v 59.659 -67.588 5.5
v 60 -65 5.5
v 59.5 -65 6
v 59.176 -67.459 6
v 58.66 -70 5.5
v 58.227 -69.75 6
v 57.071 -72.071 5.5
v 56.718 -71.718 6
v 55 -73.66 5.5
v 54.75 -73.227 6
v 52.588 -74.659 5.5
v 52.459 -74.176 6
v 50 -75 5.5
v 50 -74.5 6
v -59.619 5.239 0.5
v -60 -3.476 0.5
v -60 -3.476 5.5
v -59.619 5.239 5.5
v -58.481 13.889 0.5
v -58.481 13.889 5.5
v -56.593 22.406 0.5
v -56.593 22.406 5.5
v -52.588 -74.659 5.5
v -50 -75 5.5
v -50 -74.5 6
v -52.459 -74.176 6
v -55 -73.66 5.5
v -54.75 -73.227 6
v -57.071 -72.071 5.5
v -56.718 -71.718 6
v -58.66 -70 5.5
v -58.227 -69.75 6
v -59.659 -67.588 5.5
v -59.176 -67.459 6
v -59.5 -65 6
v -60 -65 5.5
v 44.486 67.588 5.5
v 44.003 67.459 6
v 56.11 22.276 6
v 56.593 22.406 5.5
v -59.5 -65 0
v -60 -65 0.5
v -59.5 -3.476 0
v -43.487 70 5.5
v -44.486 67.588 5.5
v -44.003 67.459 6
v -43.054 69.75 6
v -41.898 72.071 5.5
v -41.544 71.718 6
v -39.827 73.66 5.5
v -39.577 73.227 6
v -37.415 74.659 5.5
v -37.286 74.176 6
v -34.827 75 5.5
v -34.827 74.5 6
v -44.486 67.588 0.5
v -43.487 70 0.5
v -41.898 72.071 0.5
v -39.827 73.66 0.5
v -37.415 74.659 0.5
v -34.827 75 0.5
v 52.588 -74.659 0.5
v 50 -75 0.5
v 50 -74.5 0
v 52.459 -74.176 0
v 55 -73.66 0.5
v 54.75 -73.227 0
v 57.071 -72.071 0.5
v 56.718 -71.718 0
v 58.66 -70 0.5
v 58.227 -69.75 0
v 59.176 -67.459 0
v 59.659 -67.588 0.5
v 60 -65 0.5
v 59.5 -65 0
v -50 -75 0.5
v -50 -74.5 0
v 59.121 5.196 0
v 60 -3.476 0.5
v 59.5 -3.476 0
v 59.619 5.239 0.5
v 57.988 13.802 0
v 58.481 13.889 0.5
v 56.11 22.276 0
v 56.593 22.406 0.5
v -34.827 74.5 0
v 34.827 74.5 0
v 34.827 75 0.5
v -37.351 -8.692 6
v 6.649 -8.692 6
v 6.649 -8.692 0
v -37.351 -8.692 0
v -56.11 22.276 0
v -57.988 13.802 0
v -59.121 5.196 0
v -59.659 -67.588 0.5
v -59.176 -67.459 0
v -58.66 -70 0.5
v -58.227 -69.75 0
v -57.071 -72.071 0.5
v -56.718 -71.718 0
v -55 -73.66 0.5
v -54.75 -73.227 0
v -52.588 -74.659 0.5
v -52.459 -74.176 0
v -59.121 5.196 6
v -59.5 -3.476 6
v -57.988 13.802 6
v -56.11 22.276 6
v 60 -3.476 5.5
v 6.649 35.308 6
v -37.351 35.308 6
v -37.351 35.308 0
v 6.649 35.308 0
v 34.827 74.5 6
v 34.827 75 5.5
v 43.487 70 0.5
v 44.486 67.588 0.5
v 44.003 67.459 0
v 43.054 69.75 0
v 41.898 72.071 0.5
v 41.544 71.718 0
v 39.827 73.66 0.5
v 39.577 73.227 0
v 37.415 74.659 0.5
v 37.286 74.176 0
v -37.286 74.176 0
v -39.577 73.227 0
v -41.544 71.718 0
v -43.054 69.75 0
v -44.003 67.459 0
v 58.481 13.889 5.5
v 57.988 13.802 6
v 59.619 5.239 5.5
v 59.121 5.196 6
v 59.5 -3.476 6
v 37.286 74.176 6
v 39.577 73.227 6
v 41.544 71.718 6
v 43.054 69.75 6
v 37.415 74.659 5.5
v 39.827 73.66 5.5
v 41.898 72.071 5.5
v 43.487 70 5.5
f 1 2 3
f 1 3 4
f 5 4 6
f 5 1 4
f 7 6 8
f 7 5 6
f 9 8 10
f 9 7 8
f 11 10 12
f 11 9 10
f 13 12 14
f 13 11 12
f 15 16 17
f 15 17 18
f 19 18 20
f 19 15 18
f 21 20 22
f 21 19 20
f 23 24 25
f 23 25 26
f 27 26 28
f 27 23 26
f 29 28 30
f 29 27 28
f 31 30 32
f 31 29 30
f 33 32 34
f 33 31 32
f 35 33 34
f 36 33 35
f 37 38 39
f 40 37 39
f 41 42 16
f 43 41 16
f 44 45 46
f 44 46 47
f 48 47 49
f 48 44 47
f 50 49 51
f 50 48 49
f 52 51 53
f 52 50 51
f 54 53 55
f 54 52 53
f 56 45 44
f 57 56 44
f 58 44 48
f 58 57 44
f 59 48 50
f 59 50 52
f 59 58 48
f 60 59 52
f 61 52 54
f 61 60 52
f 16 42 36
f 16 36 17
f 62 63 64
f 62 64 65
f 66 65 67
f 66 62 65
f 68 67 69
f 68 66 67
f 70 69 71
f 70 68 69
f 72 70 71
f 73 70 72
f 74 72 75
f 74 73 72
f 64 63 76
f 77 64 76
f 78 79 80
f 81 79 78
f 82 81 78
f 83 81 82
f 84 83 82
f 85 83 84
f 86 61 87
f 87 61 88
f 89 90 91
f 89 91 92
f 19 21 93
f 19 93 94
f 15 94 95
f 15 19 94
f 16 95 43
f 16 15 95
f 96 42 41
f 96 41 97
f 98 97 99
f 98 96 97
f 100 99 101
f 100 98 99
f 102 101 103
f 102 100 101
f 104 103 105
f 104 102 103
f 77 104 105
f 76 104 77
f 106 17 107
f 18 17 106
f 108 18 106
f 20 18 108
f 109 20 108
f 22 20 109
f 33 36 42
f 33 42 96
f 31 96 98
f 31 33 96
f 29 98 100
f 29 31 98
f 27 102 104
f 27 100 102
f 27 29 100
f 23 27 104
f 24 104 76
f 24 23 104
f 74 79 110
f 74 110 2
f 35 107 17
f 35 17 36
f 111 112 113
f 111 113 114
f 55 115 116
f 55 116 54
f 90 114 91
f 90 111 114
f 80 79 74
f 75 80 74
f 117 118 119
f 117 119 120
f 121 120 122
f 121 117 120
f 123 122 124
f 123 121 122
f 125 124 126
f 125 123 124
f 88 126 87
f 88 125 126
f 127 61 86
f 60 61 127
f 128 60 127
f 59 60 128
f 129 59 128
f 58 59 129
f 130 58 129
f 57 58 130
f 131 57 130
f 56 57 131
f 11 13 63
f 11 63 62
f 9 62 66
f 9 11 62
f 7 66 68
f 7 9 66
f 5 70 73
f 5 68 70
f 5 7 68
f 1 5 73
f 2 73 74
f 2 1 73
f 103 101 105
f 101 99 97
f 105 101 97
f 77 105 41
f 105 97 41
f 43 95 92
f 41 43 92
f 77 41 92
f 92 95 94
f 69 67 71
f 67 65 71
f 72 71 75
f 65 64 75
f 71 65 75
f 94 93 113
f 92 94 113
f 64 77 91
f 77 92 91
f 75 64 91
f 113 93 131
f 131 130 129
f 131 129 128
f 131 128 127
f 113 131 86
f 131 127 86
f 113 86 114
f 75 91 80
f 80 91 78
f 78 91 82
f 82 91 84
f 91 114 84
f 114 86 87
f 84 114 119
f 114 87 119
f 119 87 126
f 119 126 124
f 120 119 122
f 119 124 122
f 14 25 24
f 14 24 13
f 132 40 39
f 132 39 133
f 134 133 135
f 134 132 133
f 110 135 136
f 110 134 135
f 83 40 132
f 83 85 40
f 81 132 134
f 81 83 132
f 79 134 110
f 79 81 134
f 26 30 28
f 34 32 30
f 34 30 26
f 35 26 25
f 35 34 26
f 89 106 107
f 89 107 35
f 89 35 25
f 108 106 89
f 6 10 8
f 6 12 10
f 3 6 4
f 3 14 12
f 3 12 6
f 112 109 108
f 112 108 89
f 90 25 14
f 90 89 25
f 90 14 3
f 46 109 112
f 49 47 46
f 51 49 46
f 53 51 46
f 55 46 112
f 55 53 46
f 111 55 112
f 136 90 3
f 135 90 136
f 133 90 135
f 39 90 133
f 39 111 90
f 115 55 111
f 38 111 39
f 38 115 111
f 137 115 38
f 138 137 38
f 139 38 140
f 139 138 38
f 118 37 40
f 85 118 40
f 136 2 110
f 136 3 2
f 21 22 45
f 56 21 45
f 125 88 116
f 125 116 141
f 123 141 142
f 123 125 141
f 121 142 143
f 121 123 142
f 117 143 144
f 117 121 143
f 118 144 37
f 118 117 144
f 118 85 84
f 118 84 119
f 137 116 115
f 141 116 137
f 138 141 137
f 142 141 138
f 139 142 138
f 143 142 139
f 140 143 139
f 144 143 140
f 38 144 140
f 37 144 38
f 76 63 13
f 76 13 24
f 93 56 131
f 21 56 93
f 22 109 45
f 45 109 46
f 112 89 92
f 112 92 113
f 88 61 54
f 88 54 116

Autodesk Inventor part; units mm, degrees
ref_plane "YZ Plane" through (0, 0, 0) normal (1, 0, 0) x (0, 1, 0)
ref_plane "XZ Plane" through (0, 0, 0) normal (0, 1, 0) x (-1, 0, 0)
ref_plane "XY Plane" through (0, 0, 0) normal (0, 0, 1) x (1, 0, 0)
sketch "Sketch1" plane through (0, 0, 0) normal (0, 0, 1) x (1, 0, 0)
  line L0 (-60, 75) -> (60, 75)
  line L1 (60, 75) -> (60, -75)
  line L2 (60, -75) -> (-60, -75)
  line L3 (-60, -75) -> (-60, 75)
  point P0 (0, 0)
  point P1 (60, 0)
  point P2 (0, 75)
  dimension "d0" = 120
  dimension "d1" = 150
extrude "Extrusion1" add sketch "Sketch1" along normal blind 6
sketch "Sketch2" plane through (0, 0, 6) normal (0, 0, 1) x (1, 0, 0)
  line L0 (-37.3514, 35.3082) -> (6.6486, 35.3082)
  line L1 (6.6486, 35.3082) -> (6.6486, -8.6918)
  line L2 (6.6486, -8.6918) -> (-37.3514, -8.6918)
  line L3 (-37.3514, -8.6918) -> (-37.3514, 35.3082)
  point P0 (0, 0)
  dimension "d4" = 44
  dimension "d5" = 44
extrude "Hole" cut sketch "Sketch2" against normal through all
sketch "Sketch3" plane through (0, 0, 6) normal (0, 0, 1) x (1, 0, 0)
  line L0 (6.6486, 35.3082) -> (6.6486, -8.6918) projected
  line L1 (6.6486, -8.6918) -> (-37.3514, -8.6918) projected
  line L2 (-37.3514, -8.6918) -> (-37.3514, 35.3082) projected
  line L3 (-37.3514, 35.3082) -> (6.6486, 35.3082) projected
  line L4 (-60, -75) -> (60, -75) projected
  line L5 (60, -75) -> (60, 75) projected
  line L6 (60, 75) -> (-60, 75) projected
  line L7 (-60, 75) -> (-60, -75) projected
  line L8 (-60, 9.6891) -> (-42.5, 75)
  line L9 (42.5, 75) -> (60, 9.6891)
  line L10 (-42.5, 75) -> (42.5, 75)
  line L11 (60, 75) -> (-60, 75) construction
  point P0 (0, 0)
  point P1 (0, 75)
  dimension "d9" = 15
  dimension "d10" = 85
extrude "Extrusion3" cut sketch "Sketch3" against normal through all contours L7 L6 L8 | L9 L6 L5
fillet "Fillet1" radius 10 4 edges at (60, -75, 3) (-60, -75, 3) (-42.5, 75, 3) (42.5, 75, 3)
fillet "Fillet2" radius 100 2 edges at (60, 9.6891, 3) (-60, 9.6891, 3)
chamfer "Chamfer1" distance 0.5 angle 45 24 edges at (0, 75, 6) (-40.9143, 72.9335, 6) (-50.5393, 44.997, 6) (-59.1445, 9.5765, 6) (-60, -34.2381, 6) (-57.0711, -72.0711, 6) (0, -75, 6) (57.0711, -72.0711, 6) (60, -34.2381, 6) (59.1445, 9.5765, 6) (50.5393, 44.997, 6) (40.9143, 72.9335, 6) (0, 75, 0) (-40.9143, 72.9335, 0) (-50.5393, 44.997, 0) (-59.1445, 9.5765, 0) (-60, -34.2381, 0) (-57.0711, -72.0711, 0) (0, -75, 0) (57.0711, -72.0711, 0) (60, -34.2381, 0) (59.1445, 9.5765, 0) (50.5393, 44.997, 0) (40.9143, 72.9335, 0)
equation "\"d0\" = width"
equation "\"d1\" = hight"
equation "\"hight\" = 150"
equation "\"width\" = 120"
properties part number "tc-front-panel" material "ABS Plastic"
